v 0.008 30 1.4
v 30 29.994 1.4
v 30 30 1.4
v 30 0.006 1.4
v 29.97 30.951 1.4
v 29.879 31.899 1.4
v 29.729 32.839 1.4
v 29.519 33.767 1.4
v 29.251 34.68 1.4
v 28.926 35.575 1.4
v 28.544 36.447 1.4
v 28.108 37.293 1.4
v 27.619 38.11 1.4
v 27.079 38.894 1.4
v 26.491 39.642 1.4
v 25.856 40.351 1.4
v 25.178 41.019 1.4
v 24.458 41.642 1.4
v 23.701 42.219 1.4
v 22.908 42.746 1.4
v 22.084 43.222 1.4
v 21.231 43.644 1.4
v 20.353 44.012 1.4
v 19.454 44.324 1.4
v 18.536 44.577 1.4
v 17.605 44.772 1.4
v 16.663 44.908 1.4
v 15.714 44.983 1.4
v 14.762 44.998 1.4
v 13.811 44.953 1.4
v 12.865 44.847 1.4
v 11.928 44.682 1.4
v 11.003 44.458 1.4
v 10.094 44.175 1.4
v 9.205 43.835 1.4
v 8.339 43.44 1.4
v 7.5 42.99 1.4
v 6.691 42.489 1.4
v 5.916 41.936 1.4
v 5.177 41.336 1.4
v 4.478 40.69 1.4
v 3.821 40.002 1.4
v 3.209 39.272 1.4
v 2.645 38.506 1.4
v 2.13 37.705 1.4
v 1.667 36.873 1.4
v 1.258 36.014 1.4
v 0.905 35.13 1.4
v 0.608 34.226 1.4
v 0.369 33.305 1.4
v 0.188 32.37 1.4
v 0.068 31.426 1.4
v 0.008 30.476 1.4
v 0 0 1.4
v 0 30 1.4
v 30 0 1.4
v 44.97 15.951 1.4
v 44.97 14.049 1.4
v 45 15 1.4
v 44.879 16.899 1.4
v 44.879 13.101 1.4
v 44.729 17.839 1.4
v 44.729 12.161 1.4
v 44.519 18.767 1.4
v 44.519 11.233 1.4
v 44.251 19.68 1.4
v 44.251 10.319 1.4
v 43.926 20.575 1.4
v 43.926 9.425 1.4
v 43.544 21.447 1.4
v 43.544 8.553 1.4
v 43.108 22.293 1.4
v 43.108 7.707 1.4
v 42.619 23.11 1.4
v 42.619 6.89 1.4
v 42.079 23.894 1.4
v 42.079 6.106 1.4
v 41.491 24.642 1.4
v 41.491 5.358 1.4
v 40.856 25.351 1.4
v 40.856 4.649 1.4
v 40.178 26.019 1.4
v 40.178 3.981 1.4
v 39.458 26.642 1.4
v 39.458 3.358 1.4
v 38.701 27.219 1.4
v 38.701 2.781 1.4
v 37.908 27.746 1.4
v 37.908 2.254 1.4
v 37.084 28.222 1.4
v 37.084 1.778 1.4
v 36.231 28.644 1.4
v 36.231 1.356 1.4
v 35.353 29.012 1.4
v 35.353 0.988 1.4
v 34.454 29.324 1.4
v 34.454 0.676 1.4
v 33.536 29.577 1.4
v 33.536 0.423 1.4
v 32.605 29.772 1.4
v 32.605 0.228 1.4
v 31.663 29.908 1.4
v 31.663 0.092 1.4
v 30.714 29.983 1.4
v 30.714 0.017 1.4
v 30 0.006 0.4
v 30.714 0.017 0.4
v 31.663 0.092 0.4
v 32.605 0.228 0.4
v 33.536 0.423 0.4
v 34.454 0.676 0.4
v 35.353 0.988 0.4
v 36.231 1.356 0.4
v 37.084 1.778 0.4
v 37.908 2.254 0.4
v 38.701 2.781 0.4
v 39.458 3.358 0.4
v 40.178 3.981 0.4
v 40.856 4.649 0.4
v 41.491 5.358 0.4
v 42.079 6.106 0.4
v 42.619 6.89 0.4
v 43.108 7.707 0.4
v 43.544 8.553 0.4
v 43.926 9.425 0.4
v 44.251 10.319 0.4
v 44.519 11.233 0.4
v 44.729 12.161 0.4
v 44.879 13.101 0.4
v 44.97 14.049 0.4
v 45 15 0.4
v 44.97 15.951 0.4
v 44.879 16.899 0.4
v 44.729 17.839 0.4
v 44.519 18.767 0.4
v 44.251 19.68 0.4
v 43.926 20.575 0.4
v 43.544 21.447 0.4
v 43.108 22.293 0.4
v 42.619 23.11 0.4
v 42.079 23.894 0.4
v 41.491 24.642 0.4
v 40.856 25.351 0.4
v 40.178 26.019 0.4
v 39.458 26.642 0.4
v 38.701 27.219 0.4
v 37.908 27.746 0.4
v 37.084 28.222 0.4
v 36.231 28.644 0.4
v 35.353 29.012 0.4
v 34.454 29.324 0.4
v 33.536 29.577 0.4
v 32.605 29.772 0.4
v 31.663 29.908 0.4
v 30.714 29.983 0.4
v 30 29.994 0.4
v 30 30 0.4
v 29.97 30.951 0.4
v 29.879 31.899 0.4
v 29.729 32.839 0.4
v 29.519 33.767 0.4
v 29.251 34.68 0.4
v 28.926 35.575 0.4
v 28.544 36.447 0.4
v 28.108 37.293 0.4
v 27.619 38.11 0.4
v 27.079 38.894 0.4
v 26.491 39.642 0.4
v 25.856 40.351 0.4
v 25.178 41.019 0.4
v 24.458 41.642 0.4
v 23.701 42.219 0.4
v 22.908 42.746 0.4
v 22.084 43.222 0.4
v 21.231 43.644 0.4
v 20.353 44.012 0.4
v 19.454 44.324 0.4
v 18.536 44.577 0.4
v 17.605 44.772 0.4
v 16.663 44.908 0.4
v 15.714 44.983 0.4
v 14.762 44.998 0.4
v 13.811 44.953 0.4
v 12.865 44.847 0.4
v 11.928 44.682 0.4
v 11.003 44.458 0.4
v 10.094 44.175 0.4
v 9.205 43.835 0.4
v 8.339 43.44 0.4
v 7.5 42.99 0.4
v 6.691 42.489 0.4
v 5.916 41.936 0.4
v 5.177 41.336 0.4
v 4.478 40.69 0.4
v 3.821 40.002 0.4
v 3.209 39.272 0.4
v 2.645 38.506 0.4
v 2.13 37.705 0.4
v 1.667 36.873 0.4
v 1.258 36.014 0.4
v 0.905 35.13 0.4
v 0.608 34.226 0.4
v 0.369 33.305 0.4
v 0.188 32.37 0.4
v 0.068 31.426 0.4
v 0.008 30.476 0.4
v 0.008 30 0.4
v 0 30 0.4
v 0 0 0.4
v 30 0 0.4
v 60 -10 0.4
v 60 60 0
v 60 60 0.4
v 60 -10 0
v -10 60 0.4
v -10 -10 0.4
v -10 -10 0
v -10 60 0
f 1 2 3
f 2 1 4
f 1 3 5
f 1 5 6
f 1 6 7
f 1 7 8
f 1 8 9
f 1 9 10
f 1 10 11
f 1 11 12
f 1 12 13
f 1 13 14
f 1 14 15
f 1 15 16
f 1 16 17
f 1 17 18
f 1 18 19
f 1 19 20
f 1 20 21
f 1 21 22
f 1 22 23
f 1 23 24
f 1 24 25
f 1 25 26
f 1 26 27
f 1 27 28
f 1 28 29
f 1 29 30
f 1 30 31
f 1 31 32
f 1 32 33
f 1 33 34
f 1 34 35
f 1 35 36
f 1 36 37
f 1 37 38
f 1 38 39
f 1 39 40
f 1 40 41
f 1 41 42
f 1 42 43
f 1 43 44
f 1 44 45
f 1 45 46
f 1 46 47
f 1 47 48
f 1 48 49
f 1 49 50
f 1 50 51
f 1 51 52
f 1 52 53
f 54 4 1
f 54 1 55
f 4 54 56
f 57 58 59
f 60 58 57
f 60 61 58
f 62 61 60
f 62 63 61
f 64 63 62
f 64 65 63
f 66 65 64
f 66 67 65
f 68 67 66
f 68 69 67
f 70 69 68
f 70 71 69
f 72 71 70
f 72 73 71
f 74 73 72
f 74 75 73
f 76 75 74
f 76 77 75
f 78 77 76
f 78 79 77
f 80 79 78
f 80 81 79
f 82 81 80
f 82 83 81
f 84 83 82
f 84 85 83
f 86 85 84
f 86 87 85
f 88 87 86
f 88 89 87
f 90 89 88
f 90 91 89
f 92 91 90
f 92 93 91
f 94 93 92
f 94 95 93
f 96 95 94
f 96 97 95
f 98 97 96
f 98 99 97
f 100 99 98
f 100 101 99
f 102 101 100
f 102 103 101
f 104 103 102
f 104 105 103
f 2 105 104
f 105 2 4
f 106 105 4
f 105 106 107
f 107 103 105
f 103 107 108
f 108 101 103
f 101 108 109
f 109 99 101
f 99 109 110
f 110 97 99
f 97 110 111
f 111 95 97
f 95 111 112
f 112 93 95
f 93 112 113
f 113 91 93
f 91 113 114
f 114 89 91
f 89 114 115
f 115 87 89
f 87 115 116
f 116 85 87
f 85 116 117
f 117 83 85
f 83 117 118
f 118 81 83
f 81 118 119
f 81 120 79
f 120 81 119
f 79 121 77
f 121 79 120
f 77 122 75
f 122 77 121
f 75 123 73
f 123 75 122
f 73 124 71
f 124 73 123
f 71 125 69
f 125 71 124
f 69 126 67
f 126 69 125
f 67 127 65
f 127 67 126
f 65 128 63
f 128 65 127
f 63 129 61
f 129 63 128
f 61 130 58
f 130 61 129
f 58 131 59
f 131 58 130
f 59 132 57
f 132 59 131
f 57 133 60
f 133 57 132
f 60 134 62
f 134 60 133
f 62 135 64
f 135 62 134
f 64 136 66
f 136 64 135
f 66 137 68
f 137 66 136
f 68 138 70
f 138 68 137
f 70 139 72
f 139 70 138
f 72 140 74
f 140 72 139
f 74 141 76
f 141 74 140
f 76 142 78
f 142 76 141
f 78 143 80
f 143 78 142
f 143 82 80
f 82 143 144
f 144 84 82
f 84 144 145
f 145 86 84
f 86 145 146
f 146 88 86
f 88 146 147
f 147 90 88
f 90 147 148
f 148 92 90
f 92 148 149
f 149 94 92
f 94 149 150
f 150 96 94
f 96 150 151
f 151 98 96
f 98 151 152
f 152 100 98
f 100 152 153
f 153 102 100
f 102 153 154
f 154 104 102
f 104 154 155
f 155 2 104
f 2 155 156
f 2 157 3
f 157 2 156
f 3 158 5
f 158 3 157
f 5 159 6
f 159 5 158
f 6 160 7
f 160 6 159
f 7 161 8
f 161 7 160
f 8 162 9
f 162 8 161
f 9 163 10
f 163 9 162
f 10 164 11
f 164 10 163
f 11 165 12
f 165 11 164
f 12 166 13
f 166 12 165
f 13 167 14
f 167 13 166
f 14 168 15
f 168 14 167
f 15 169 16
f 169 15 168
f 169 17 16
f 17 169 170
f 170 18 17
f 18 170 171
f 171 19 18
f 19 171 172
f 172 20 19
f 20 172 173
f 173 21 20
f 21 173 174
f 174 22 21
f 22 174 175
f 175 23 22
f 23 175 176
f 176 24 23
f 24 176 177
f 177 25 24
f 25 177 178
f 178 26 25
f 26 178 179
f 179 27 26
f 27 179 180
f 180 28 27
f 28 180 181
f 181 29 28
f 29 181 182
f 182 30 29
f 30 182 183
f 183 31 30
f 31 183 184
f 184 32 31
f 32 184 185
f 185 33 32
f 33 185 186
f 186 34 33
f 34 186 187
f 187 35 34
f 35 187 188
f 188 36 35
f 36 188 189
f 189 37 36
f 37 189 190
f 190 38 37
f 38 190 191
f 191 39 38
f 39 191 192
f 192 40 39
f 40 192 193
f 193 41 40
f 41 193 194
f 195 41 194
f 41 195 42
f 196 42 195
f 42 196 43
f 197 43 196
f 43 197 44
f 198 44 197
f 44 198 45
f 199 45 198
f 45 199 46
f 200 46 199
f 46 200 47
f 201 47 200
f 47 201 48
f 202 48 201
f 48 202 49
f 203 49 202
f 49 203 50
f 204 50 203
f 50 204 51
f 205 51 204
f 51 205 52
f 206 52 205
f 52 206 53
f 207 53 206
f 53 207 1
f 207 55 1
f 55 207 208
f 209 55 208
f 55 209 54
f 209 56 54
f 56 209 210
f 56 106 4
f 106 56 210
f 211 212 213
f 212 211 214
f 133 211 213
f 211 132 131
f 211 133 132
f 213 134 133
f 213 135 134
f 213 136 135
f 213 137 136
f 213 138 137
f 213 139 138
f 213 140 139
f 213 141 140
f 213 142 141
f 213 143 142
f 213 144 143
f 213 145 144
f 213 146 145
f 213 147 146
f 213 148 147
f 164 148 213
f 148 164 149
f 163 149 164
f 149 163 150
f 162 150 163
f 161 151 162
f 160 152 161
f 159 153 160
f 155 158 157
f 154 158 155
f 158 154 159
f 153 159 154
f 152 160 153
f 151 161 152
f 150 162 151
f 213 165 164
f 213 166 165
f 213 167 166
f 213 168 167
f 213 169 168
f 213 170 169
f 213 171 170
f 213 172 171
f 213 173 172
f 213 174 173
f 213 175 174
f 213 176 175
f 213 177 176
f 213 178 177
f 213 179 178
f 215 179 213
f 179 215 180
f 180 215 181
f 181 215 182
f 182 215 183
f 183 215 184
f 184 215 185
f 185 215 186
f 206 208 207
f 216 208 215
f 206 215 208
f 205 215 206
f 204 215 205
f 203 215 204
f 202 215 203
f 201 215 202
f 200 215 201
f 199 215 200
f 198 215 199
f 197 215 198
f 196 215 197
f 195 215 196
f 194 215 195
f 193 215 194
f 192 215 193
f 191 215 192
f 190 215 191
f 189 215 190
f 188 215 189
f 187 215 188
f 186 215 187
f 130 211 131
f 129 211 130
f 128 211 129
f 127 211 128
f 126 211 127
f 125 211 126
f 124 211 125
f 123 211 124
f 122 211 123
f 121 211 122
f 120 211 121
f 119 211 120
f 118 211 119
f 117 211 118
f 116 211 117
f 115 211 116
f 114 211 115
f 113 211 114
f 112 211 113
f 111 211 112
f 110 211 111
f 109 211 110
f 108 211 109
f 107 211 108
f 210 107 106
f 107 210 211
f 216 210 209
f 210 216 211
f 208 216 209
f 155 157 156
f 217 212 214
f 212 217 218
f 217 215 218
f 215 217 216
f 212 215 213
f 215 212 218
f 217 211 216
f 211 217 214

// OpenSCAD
// Pride hearts, overlaid with stripes or rings
//
// TODO
//  * Rename a bunch of stripe variables to overlay variables
//	* Test with fabric
//	* Re-origin the rings or stripes for each heart
//	* Get rid of 99 in ring code
//

/* [Grid] */
// Count of items in X direction
_CountX = 1;

// Count of items in Y direction
_CountY = 1;

// X spacing
_SpaceX = 50;

// Y spacing
_SpaceY = 50;

/* [Base] */
// Base height
_BaseZ = 0.4;

// Base padding
_BasePad = 10;

/* [Hearts] */
// Heart thickness
_HeartZ = 0.6;

// Circle diameter
_Diameter = 30;

/* [Overlay] */
_Overlay = "Stripes";	// ["Stripes", "Rings"]

// Stripe width
_StripeWidth = 2;

// Stripe thickness
_StripeZ = 0.4;

// Stripe rotation
_StripeRotation = 0;

// Ring origin
_RingOrigin = "Bottom"; // ["Bottom", "Center", "Tip"]

/* [Extruders] */

// Extruder to render
_WhichExtruder = "All"; // ["All", 1, 2, 3, 4, 5]

// Base extruder
_BaseExtruder = 1; 			// [1, 2, 3, 4, 5]

// Heart extruder
_HeartExtruder = 1;			// [1, 2, 3, 4, 5]

// Stripe extruder 1
_StripeExtruder1 = true;

// Stripe extruder 2
_StripeExtruder2 = true;

// Stripe extruder 3
_StripeExtruder3 = true;

// Stripe extruder 4
_StripeExtruder4 = true;

// Stripe extruder 5
_StripeExtruder5 = true;

// Create _StripeExtruders vector from individual values, then use it to create _StripeExtruders
_StripeExtrudersVec = [false, _StripeExtruder1, _StripeExtruder2, _StripeExtruder3, _StripeExtruder4, _StripeExtruder5];
_StripeExtruders    = [for (i = [0 : 5]) if (_StripeExtrudersVec[i]) i];

// Map a value of _WhichExtruder to an OpenSCAD color
function ExtruderColor(Extruder) = 
  (Extruder == 1  ) ? "red"    : 
  (Extruder == 2  ) ? "green"  : 
  (Extruder == 3  ) ? "blue"   : 
  (Extruder == 4  ) ? "pink"   :
  (Extruder == 5  ) ? "yellow" :
                      "purple" ;
					  
// If _WhichExtruder is "All" or is not "All" and matches the requested extruder, render 
// the child nodes.

module Extruder(DoExtruder)
{
	color(ExtruderColor(DoExtruder))
	{
		if (_WhichExtruder == "All" || DoExtruder == _WhichExtruder)
		{
			children();
		}
	}
}

// Render one heart 
module RenderHeart(Diameter, Thickness)
{
	Radius = Diameter / 2;

	linear_extrude(Thickness)
	{
		union()
		{
			square(Diameter, center=false);
			translate([Diameter, Radius, 0]) circle(d=Diameter, $fn=99);
			translate([Radius, Diameter, 0]) circle(d=Diameter, $fn=99);
		}
	}
}

// Render a grid of hearts
module RenderGrid(CountX, CountY, SpaceX, SpaceY, Diameter, Thickness)
{
	for (x = [0 : CountX - 1])
	{
		for (y = [0 : CountY - 1])
		{
			PointX = x * SpaceX;
			PointY = y * SpaceY;
			
			translate([PointX, PointY, 0])
			{
				RenderHeart(Diameter, Thickness);
			}
		}
		
	}
}

// Render base
module RenderBase(BaseZ, BasePad, CountX, CountY, SpaceX, SpaceY)
{
	SizeX = BasePad + (CountX * SpaceX) + BasePad;
	SizeY = BasePad + (CountY * SpaceY) + BasePad;
	
	translate([-BasePad, -BasePad, 0])
	{
		cube([SizeX, SizeY, BaseZ], center=false);
	}
}

// Render Pride stripes for overlay
module RenderStripes(Extruders, CountX, CountY, SpaceX, SpaceY, StripeZ, StripeWidth, StripeRotation)
{
	// Over-estimate size of stripes, since this will be clipped wiht the hearts
	SizeX = 4 * CountX * SpaceX;
	SizeY = 4 * CountY * SpaceY;
	
	rotate([0, 0, StripeRotation])
	{
		translate([-SizeX / 2, -SizeY / 2, 0])
		{
			for (s = [0 : SizeX / StripeWidth])
			{
				Extruder(Extruders[floor(s % len(Extruders))])
				{
					translate([s * StripeWidth, 0, 0])
					{
						cube([StripeWidth, SizeY, StripeZ], center=false);
					}
				}
			}
		}
	}
}

// Compute center (origin) of rings given diameter and origin
// TODO - this works for the first heart only

function GetRingOriginX(Diameter, Origin) =
 (Origin == "Bottom") ? 0            :
 (Origin == "Center") ? Diameter / 2 :
 (Origin == "Tip")     ? Diameter    :
 999;		// FAIL
 
function GetRingOriginY(Diameter, Origin) =
 (Origin == "Bottom") ? 0            :
 (Origin == "Center") ? Diameter / 2 :
 (Origin == "Tip")     ? Diameter    :
 999;		// FAIL

// Render Pride rings for overlay
module RenderRings(Extruders, CountX, CountY, SpaceX, SpaceY, StripeZ, StripeWidth, HeartDiameter, RingOrigin)
{
	RingRadius = StripeWidth / 2;
	RingCount  = 99;	// FIX
	
	OriginX = GetRingOriginX(HeartDiameter, RingOrigin);
	OriginY = GetRingOriginY(HeartDiameter, RingOrigin);
	
	translate([OriginX, OriginY, 0])
	{
		linear_extrude(StripeZ)
		{
			// First one is a full circle
			Extruder(Extruders[0])
			{
				circle(r=RingRadius);
			}
			
			// All others are rings
			for (Ring = [1 : RingCount])
			{
				Extruder(Extruders[floor(Ring % len(Extruders))])
				{
					difference()
					{
						InnerRadius = Ring * RingRadius;
						OuterRadius = InnerRadius + RingRadius;
						circle(r=OuterRadius, $fn=99);
						circle(r=InnerRadius, $fn=99);
					}
				}
			}
		}
	}
}

module main()
{
	// Base
	if (_BaseZ > 0)
	{
		Extruder(_BaseExtruder)
		{
			RenderBase(_BaseZ, _BasePad, _CountX, _CountY, _SpaceX, _SpaceY);
		}
	}
	
	// Grid of hearts
	if (_HeartZ > 0)
	{
		translate([0, 0, _BaseZ])
		{
			Extruder(_HeartExtruder)
			{
				RenderGrid(_CountX, _CountY, _SpaceX, _SpaceY, _Diameter, _HeartZ);
			}
		}
	}
	
	// Stripes or Rings
	//** StripeExtruders rename to OverlayExtruders **//
	translate([0, 0, _BaseZ + _HeartZ])
	{
		intersection()
		{
			if (_Overlay == "Stripes")
			{
				RenderStripes(_StripeExtruders, _CountX, _CountY, _SpaceX, _SpaceY, _StripeZ, _StripeWidth, _StripeRotation);
			}
		
			if (_Overlay == "Rings")
			{
				RenderRings(_StripeExtruders, _CountX, _CountY, _SpaceX, _SpaceY, _StripeZ, _StripeWidth, _Diameter, _RingOrigin);
			}
			
			RenderGrid(_CountX, _CountY, _SpaceX, _SpaceY, _Diameter, _StripeZ + .01);
		}
	}
}

main();
